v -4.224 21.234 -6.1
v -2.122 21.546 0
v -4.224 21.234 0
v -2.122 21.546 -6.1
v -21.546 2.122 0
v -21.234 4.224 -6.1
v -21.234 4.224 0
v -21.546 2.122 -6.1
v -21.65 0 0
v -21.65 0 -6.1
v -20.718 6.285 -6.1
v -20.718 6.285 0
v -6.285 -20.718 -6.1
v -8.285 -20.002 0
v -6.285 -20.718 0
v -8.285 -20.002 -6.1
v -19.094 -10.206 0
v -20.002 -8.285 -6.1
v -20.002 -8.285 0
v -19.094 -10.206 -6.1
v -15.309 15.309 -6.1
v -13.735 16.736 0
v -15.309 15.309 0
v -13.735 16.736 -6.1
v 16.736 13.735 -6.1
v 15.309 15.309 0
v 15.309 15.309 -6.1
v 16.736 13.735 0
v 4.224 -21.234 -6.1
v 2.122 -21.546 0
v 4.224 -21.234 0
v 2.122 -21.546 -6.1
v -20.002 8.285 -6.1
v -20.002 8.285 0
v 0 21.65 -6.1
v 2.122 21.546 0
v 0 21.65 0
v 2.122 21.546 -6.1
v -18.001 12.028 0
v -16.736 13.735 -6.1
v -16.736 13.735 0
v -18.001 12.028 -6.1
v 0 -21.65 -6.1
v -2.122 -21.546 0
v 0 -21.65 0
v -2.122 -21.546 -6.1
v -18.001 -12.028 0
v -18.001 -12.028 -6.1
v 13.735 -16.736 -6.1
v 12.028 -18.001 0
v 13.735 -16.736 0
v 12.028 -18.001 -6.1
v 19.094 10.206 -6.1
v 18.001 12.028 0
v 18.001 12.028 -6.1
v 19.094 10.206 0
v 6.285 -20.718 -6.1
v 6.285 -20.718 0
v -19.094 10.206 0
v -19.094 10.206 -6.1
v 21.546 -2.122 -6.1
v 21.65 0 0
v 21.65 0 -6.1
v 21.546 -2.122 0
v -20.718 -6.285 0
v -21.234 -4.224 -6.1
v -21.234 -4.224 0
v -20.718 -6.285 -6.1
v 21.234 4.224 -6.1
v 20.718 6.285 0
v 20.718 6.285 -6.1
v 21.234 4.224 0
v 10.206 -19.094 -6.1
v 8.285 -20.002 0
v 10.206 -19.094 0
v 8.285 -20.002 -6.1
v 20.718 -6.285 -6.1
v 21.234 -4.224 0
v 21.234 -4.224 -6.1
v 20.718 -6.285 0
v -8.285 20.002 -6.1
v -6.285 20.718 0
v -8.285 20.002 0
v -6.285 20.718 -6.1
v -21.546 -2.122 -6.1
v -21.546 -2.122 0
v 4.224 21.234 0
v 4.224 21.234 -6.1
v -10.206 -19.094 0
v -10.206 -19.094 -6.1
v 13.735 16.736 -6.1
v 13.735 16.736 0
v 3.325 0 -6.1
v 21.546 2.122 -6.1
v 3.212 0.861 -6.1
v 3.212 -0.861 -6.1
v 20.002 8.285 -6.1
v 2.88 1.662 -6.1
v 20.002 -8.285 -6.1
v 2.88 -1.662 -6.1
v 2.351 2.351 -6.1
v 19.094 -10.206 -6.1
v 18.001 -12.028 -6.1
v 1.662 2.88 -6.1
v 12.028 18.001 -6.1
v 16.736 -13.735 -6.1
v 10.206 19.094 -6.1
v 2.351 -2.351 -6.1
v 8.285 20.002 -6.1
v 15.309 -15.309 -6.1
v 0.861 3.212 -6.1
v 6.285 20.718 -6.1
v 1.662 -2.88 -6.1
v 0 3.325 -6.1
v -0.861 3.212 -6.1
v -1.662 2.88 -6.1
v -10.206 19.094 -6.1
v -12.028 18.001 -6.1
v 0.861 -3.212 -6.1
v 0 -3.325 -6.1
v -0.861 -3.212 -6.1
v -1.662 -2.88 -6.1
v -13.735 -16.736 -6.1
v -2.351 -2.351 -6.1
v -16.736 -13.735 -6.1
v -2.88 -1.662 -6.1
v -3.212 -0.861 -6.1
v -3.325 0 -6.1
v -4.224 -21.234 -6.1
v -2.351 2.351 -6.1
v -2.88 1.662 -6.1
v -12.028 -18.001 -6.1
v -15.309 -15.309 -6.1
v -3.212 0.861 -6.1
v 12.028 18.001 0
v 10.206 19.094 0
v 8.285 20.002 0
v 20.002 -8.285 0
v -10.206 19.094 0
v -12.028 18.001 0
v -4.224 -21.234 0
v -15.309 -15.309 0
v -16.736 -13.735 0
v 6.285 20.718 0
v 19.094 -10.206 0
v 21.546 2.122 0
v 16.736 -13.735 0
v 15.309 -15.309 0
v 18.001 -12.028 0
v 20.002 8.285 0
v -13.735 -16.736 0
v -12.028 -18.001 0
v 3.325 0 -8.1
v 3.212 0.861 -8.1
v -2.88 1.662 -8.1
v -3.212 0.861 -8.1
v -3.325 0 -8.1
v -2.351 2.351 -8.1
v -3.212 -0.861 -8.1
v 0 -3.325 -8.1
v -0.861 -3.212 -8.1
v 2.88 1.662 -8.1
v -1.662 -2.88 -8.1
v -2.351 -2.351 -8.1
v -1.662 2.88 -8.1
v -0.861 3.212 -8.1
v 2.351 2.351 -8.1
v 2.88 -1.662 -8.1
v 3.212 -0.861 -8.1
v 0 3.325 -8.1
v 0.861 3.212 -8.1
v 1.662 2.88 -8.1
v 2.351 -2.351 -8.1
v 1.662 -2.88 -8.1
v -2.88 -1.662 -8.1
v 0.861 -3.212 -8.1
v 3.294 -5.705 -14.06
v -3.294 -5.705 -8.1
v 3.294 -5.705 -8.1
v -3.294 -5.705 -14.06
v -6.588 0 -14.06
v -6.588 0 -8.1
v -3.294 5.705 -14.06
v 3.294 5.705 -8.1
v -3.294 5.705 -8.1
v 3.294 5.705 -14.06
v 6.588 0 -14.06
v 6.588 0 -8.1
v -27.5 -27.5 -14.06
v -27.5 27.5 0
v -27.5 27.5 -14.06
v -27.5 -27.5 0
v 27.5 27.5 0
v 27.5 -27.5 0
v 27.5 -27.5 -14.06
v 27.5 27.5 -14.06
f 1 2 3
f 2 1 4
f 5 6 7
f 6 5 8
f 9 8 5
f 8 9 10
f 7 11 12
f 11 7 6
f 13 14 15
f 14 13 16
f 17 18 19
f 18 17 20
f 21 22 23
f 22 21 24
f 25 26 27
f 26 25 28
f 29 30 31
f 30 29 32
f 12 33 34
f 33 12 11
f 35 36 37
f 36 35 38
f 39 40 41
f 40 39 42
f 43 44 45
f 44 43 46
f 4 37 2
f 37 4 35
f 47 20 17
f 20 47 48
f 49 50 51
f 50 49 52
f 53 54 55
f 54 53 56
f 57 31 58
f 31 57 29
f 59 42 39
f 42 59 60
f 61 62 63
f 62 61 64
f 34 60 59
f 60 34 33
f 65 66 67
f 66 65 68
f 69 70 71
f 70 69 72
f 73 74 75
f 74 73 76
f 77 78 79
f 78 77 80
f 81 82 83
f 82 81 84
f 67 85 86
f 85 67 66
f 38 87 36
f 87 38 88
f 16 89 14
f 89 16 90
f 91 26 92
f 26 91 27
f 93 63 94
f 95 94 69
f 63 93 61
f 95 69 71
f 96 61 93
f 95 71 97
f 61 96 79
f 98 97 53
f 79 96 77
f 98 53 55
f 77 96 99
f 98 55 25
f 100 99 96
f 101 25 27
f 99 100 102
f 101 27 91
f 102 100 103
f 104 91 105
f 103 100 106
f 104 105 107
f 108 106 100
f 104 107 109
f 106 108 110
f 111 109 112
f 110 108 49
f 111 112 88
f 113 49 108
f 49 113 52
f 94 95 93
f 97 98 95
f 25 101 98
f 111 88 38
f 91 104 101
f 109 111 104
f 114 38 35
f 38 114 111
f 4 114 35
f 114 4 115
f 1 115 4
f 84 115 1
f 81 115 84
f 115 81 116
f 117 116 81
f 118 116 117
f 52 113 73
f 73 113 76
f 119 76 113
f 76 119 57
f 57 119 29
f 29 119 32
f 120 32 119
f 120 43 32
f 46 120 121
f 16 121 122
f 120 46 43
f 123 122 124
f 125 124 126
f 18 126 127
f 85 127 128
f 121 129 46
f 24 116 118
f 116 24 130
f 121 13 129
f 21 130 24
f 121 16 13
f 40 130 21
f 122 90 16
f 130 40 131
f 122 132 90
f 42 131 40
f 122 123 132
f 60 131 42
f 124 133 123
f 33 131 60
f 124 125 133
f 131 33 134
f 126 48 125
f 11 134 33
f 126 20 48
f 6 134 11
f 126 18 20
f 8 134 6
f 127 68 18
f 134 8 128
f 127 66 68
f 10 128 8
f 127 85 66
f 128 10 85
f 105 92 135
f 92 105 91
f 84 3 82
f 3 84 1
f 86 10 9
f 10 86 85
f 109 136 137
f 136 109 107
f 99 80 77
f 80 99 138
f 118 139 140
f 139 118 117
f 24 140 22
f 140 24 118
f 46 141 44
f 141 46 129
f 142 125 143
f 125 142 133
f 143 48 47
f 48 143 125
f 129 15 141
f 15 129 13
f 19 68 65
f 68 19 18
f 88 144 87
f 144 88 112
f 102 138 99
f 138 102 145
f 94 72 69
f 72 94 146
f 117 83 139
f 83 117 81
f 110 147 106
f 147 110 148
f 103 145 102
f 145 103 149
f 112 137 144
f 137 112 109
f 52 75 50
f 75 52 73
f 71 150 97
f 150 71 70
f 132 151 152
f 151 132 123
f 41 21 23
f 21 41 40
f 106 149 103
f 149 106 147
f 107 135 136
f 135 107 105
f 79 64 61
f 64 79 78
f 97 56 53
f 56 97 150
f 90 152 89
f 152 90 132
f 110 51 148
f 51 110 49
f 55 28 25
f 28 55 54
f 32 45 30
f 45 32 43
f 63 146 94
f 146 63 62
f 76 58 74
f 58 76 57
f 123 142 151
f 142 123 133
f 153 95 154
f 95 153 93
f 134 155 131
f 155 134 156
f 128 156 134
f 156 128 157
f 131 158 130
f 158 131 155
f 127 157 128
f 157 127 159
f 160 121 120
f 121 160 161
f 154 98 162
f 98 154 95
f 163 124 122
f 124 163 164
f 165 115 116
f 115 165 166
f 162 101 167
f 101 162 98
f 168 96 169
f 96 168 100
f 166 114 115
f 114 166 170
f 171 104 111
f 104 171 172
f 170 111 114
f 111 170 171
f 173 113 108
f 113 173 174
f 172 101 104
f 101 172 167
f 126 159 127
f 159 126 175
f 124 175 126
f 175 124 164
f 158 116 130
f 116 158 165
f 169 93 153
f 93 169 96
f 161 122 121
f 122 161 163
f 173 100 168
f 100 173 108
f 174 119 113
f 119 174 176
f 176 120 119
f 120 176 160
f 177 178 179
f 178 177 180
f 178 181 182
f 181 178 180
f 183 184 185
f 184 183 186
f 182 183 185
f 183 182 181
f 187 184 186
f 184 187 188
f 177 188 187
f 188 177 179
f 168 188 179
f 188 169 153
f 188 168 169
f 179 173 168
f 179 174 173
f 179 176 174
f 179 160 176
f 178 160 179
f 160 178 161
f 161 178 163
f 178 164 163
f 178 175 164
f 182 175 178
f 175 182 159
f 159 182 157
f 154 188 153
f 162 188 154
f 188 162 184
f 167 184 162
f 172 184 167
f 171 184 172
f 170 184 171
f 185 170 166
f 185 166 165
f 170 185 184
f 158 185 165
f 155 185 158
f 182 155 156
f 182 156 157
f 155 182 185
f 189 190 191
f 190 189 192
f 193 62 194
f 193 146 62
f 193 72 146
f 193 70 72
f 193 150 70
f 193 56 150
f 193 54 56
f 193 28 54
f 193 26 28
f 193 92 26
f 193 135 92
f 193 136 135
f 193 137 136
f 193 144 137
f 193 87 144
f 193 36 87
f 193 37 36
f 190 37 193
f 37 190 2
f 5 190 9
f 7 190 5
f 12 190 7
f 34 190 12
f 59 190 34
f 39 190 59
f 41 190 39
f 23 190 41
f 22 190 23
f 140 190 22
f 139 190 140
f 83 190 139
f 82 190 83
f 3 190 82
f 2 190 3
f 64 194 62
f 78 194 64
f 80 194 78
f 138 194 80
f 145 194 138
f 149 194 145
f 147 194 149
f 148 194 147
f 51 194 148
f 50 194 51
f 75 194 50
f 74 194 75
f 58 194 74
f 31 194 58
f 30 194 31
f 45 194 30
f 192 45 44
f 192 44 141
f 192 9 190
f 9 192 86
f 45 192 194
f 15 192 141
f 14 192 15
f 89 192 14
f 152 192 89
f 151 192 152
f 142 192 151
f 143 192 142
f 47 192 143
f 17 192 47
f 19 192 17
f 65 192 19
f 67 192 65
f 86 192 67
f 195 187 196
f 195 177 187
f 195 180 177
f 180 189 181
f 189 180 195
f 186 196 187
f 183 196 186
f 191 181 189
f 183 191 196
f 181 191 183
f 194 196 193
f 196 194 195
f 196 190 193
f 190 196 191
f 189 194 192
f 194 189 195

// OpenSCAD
// file: lib/soft.scad
// Rounded building blocks for the softened parts.

// A slab from y = -t to y = 0, spanning x = [x0, x1] and z = [z0, z1], with
// its corners rounded by r (seen along y) and its back edges (at y = -t)
// rounded by rr. The front face (y = 0) stays flat for adhesive or contact.
module soft_slab(x, z, t, r, rr) {
  hull() for (cx = [x[0] + r, x[1] - r], cz = [z[0] + r, z[1] - r])
    translate([cx, 0, cz]) {
      rotate([90, 0, 0]) cylinder(r = r, h = t - rr, $fn = 48);
      translate([0, -t + rr, 0]) rotate([90, 0, 0]) rotate_extrude($fn = 48)
        translate([r - rr, 0]) circle(r = rr, $fn = 24);
    }
}

// A box [x0..x1] x [y0..y1] x [z0..z1] with every edge rounded by r.
module soft_box(x, y, z, r) {
  hull() for (cx = [x[0] + r, x[1] - r], cy = [y[0] + r, y[1] - r], cz = [z[0] + r, z[1] - r])
    translate([cx, cy, cz]) sphere(r = r, $fn = 24);
}

// 2D: fill concave corners with radius fillet, then round convex corners by
// round (which must be under half the thinnest wall, or the wall vanishes).
module soft_2d(fillet, round) {
  offset(r = round) offset(delta = -round) offset(r = -fillet) offset(delta = fillet) children();
}
// file: lib/joint.scad
// The two glued joints that join the three prints.
//
// Rod to plate: the rod's top end, D-shaped, goes up into a socket in the
// pocket's solid base, from the plate's bottom edge. The flat faces the
// monitor (+y), so the rod goes in one way only. Above the socket a cone,
// steep enough to print without support, narrows to the cord channel.
// In the mount's coordinates.
//
// Rod to dock: a flange on the rod's front end sits flat on the dock's back,
// a glue gap of fit / 2 away, and a teardrop spigot, point down, goes into a
// matching hole in the dock. In the Car Thing's local frame (geometry.scad),
// joint_x along the Car Thing, behind the plug board, where the rod meets the dock.

function socket_cone_h() = (rod_d + fit - cord_d - 1) / 2 * tan(socket_cone);

// The keep-side of the D flat: everything at y below the flat.
module d_flat_side(clear, z0, h) {
  translate([rod_x() - rod_d, rod_y() - rod_d, z0])
    cube([2 * rod_d, rod_d + rod_d / 2 - socket_flat + clear, h]);
}

// The rod's top end, from just under the plate's bottom edge up to socket_depth.
module rod_top_end() {
  intersection() {
    translate([rod_x(), rod_y(), -fit / 2]) cylinder(d = rod_d, h = socket_depth + fit / 2, $fn = $fn_rod);
    d_flat_side(0, -fit, socket_depth + 2 * fit);
  }
}

// The socket, fit larger than the rod's end, and the cone above it.
module socket_negative() {
  intersection() {
    union() {
      translate([rod_x(), rod_y(), -1]) cylinder(d = rod_d + fit, h = socket_depth + 1, $fn = $fn_rod);
      // Started 1 mm down and that much wider, so it meets the bore exactly at
      // socket_depth (an overlap there leaves a hairline ledge to print over).
      translate([rod_x(), rod_y(), socket_depth - 1])
        cylinder(d1 = rod_d + fit + 2 / tan(socket_cone), d2 = cord_d + 1, h = socket_cone_h() + 1, $fn = $fn_rod);
    }
    d_flat_side(fit / 2, -2, socket_depth + socket_cone_h() + 4);
  }
}

// A teardrop: a circle of diameter d with a 45 degree point toward +Y.
module teardrop_2d(d) {
  hull() {
    circle(d = d, $fn = 48);
    polygon([[0, d / 2 * sqrt(2)], [-d / 4, 0], [d / 4, 0]]);
  }
}

// The spigot's axis runs along local +y through this point, at the dock's back.
function joint_centre() = [joint_x, -backplate_thickness(), -ct_h / 2];

// The flange and spigot, in the local frame. rotate([-90, 0, 0]) turns the
// extrusion's +z to local +y and the 2D +Y to local -z, so the point is down.
module flange_local() {
  c = joint_centre();
  face = c[1] - fit / 2;
  translate([c[0], face, c[2]]) rotate([90, 0, 0]) cylinder(d = flange_d, h = flange_t, $fn = 96);
  translate([c[0], face - 0.01, c[2]]) rotate([-90, 0, 0])
    linear_extrude(spigot_len + fit / 2 + 0.01) teardrop_2d(spigot_d);
}

// The spigot's hole in the dock.
module spigot_hole_local() {
  c = joint_centre();
  translate([c[0], c[1] - 1, c[2]]) rotate([-90, 0, 0])
    linear_extrude(spigot_len + 0.5 + 1) offset(delta = fit / 2) teardrop_2d(spigot_d);
}

// Points around the flange's rim on both its faces, in the local frame.
function flange_rim_pts() =
  let (c = joint_centre(), r = flange_d / 2)
  [for (a = [0 : 15 : 345], y = [c[1] - fit / 2, c[1] - fit / 2 - flange_t])
     [c[0] + r * cos(a), y, c[2] + r * sin(a)]];
// file: lib/rod.scad
// The rod: the one visible part of the mount, and its own print. Its top end
// glues up into a socket under the pocket (joint.scad); it runs straight down
// the plate's back, on past the monitor's bottom edge, bends once behind the
// Car Thing, and runs straight forward to a flange glued to the centre of the
// dock's back. The cord runs inside it, from the pocket to the plug's board.

// Centred on the pocket, and the Car Thing centred on the rod.
function rod_x() = pocket_x0() + pocket[0] / 2;
// The vertical run sits against the plate's back, 1 mm into its line; inside
// the socket its D flat clears the plate.
function rod_y() = -plate_t - rod_d_hidden / 2 + 1;
// Where the forward run meets the dock's back: the Car Thing's centre.
function rod_entry() = ct_to_global(joint_centre());
// The cord channel's top, just inside the pocket's floor.
function cord_z_top() = pocket_z0 + 1;

// The rod prints standing as mounted; its lowest point is the flange's
// bottom edge, on the face toward the rod. The slicer supports the hidden
// underside of the bend, the forward run and the flange.
function rod_low_z() =
  ct_to_global(joint_centre())[2] - (fit / 2 + flange_t) * sin(tilt) - flange_d / 2 * cos(tilt);

// The highest z on the vertical run below which the rod, at rod_d_hidden, is
// hidden from the seat: its front and both sides, at every z down to the bend.
// Above it the rod shows and stays rod_d; below it the rod may thicken.
function rod_surface_hidden(z) =
  let (r = rod_d_hidden / 2)
  len([for (p = [[rod_x(), rod_y() + r, z], [rod_x() - r, rod_y(), z], [rod_x() + r, rod_y(), z]])
         if (!hidden_from_eye(global_to_ct(p))) p]) == 0;
function rod_hide_z() =
  let (zf = rod_entry()[2] + rod_bend_r, zs = [for (z = [0 : -0.5 : zf]) z],
       ok = [for (i = [0 : len(zs) - 1]) if (len([for (j = [i : len(zs) - 1]) if (!rod_surface_hidden(zs[j])) j]) == 0) zs[i]])
  len(ok) > 0 ? ok[0] : zf;
// The taper from rod_d to rod_d_hidden starts 2 mm below that line.
function rod_taper_z0() = rod_hide_z() - 2;
function rod_taper_len() = min(10, rod_taper_z0() - (rod_entry()[2] + rod_bend_r));

// The cord's top in the pocket, the bend's corner, and the dock's back.
function rod_corners() = [
  [rod_x(), rod_y(), cord_z_top()],
  [rod_x(), rod_y(), rod_entry()[2]],
  rod_entry()
];

// Points along the forward run's top, from the bend's end to the dock.
function rod_visible_pts() =
  let (y0 = rod_y() + rod_bend_r, y1 = rod_entry()[1], z = rod_entry()[2] + rod_d_hidden / 2)
  [for (y = [y0 : 5 : y1]) [rod_x(), y, z], [rod_x(), y1, z]];

// The bend's quarter torus.
module rod_bend() {
  translate([rod_x(), rod_y() + rod_bend_r, rod_entry()[2] + rod_bend_r])
    multmatrix([[0, 0, 1, 0], [-1, 0, 0, 0], [0, -1, 0, 0], [0, 0, 0, 1]])
      rotate_extrude(angle = 90, $fn = $fn_rod)
        translate([rod_bend_r, 0]) circle(d = rod_d_hidden, $fn = $fn_rod);
}

module rod_solid() { rod_body(); }

module rod_body() {
  x = rod_x(); y = rod_y(); zf = rod_entry()[2]; r = rod_bend_r;
  d = rod_d_hidden;
  // The flare reaches past the dock's back all round (it leans forward below
  // the entry by its radius x tan(tilt)) and is cut at the flange's face.
  y_end = rod_entry()[1] + (d + 8) / 2 * tan(tilt) + 1;
  // The top end, D-shaped, up in the socket.
  rod_top_end();
  // Vertical run: rod_d from the plate's bottom edge down to the taper, then
  // rod_d_hidden. (A uniform rod, rod_d_hidden == rod_d, has no taper to place.)
  zt = rod_d_hidden > rod_d ? rod_taper_z0() : zf + r;
  tl = rod_d_hidden > rod_d ? rod_taper_len() : 0;
  translate([x, y, zt]) cylinder(d = rod_d, h = -fit / 2 - zt, $fn = $fn_rod);
  if (tl > 0) {
    translate([x, y, zt - tl]) cylinder(d1 = d, d2 = rod_d, h = tl, $fn = $fn_rod);
    translate([x, y, zf + r]) cylinder(d = d, h = zt - tl - zf - r, $fn = $fn_rod);
  }
  // The bend: a quarter torus in the y-z plane, centred on the corner's
  // inside. rotate_extrude sweeps +X to +Y; mapped so +X -> -y, +Y -> -z.
  rod_bend();
  // Forward run, flaring over its last 8 mm into the flange, and cut off
  // inside the flange, short of its face (a coplanar cut leaves slivers).
  difference() {
    union() {
      translate([x, y + r, zf]) rotate([-90, 0, 0]) cylinder(d = d, h = y_end - y - r - 8, $fn = $fn_rod);
      translate([x, y_end - 8, zf]) rotate([-90, 0, 0]) cylinder(d1 = d, d2 = d + 8, h = 8, $fn = $fn_rod);
    }
    ct_place() translate([-50, joint_centre()[1] - fit / 2 - 0.5, -ct_h - 50]) cube([ct_w + 100, 100, ct_h + 100]);
  }
  ct_place() flange_local();
}

function cord_corners() = dedupe([
  rod_corners()[0],
  rod_corners()[1],
  rod_entry(),
  ct_to_global(dock_cord_end())
]);

function cord_path() = round_path(cord_corners(), cord_bend_r);

// margin grows the channel, so the leak test can demand a minimum wall.
module cord_channel(margin = 0) { tube(cord_path(), cord_d + 1 + 2 * margin); }
// file: lib/pocket.scad
// The pocket behind the plate for the charge-through cable, the C-to-A
// adapter and the Wi-Fi dongle, and where the shelf slot sits beside it.
// The pocket's outer face is open inside a retaining frame, in case the
// monitor's back is metal; put the dongle at that open face.

function shelf_x0() = plate_r;  // clear of the plate's rounded corner
// The plate's vertical ribs: each one's left edge. One at the plate's left
// edge, beside the shelf, and two over the pocket; the shelf's tall lip
// stiffens the stretch between.
function rib_xs() = [wall, 2 * plate_w / 3, plate_w - wall - rib_w];
function pocket_x0() = plate_w - pocket[0] - wall;

module pocket_positive() {
  // Rounded on every edge; its plate side sinks into the plate. Solid from
  // the plate's bottom edge up to the pocket's floor: the rod's socket is
  // bored up into that base. It starts below
  // the bottom edge and the plate is cut flat there (plate_part()).
  soft_box([pocket_x0() - wall, pocket_x0() + pocket[0] + wall],
           [-plate_t - pocket[1], -plate_t + 1],
           [-soft_r - 1, pocket_z0 + pocket[2] + wall], soft_r);
}

module pocket_negative() {
  // The cavity.
  translate([pocket_x0(), -plate_t - pocket[1] + wall, pocket_z0])
    cube([pocket[0], pocket[1] - wall + 0.01, pocket[2]]);
  // The open outer face, inside the frame.
  translate([pocket_x0() + pocket_frame - wall, -plate_t - pocket[1] - 1, pocket_z0 + pocket_frame - wall])
    cube([pocket[0] - 2 * pocket_frame + 2 * wall, wall + 2, pocket[2] - 2 * pocket_frame + 2 * wall]);
  // The power cable's exit: a notch down from the top of the side wall
  // toward the monitor's edge, open at the top so the cable lays in, and
  // It cuts the wall only.
  translate([pocket_x0() + pocket[0], -plate_t - pocket[1] / 2 - 4, pocket_z0 + pocket[2] / 2])
    cube([wall + 1, 8, pocket[2] / 2 + wall + 1]);
}

// The plate's vertical ribs, on its back, each with its lower end sloping
// back into the plate so it doesn't start in mid-air.
module plate_ribs() {
  for (x = rib_xs())
    translate([0, -plate_t + 0.5, 0]) hull() {
      soft_box([x, x + rib_w], [-5.5, 0], [rib_z0 + 6.5, plate_h - plate_r], 1.4);
      translate([x, -0.5, rib_z0]) cube([rib_w, 0.5, plate_h - plate_r - rib_z0 - 1.4]);
    }
}
// file: lib/dock.scad
// The dock: the hidden backplate behind the Car Thing, in its local frame
// (see geometry.scad). A rounded slab bears on the Car Thing's raised
// platform and stands ct_step clear of its thin ends; the pot magnet sits
// flush in its front, on the platform; a block over the thin tab end holds
// the USB-C plug breakout, pointing +x at the port in the platform's end wall.
//
// The board lies in the x-z plane at y = ct_port_y, its plug through a slot
// in the block's shoulder (the +x face). The shoulder is the hard stop: the
// Car Thing slides -x onto the plug until the port wall meets it. The board
// slides in from the block's open bottom and is potted with epoxy; the -x end
// is closed and takes the docking push. The cord reaches the board from
// behind, through the backplate. The rod is a separate print: its spigot
// glues into a hole in the dock's back (joint.scad), behind the board.

// The block's length along x from the port wall: shoulder, board, closed end.
function dock_block_len() = plug_shoulder + plug_board[1] + fit + wall;
// How far the plug goes into the port.
function dock_engaged() = plug_len - plug_shoulder;
// The block's furthest local y, toward the thin end's surface: the board plus
// a thin wall. The plug's shell may pass beyond it, through the shoulder slot.
function dock_block_front() = ct_port_y + plug_board[2] / 2 + fit + dock_floor_wall;
function dock_block_half_h() = plug_board[0] / 2 + fit + wall;
// Where the cord channel ends: behind the board, under the rod's axis.
function dock_cord_end() = [joint_x, ct_port_y - plug_board[2] / 2 - 1.5, -ct_port_z];

function dock_x1() = ct_platform[0] - fit;  // the shoulder face
function dock_board_x0() = dock_x1() - plug_shoulder - plug_board[1] - fit;  // the board's far end
function dock_plate_box() = [[bp_inset, ct_w - bp_inset], [-ct_h + bp_inset, -bp_inset]];  // [x range, z range]

// Points the visibility rule tests: the plate's real rounded outline at its
// front face, where its back edge round starts, and on its back face (shrunk
// by that round), every 10 degrees around each corner; and the block's corners.
function dock_outline_pts() =
  let (
    b = dock_plate_box(), bt = backplate_thickness(), rr = bp_r / 2,
    zc = -ct_port_z, h = dock_block_half_h(),
    corners = [[b[0][0] + bp_r, b[1][0] + bp_r, 180], [b[0][1] - bp_r, b[1][0] + bp_r, 270],
               [b[0][1] - bp_r, b[1][1] - bp_r, 0], [b[0][0] + bp_r, b[1][1] - bp_r, 90]]
  )
  concat(
    [for (c = corners, a = [c[2] : 10 : c[2] + 90], yr = [[0, bp_r], [-bt + rr, bp_r], [-bt, bp_r - rr]])
       [c[0] + yr[1] * cos(a), yr[0], c[1] + yr[1] * sin(a)]],
    [for (x = [dock_x1() - dock_block_len(), dock_x1()], z = [zc - h, zc + h], y = [0, dock_block_front()]) [x, y, z]]
  );

// The board pocket and the plug's slot through the shoulder, as a box in the
// local frame: [[x0, y0, z0], [x1, y1, z1]].
function dock_board_box() = [
  [dock_board_x0(), ct_port_y - plug_board[2] / 2 - 2.5, -ct_port_z - dock_block_half_h() - 1],
  [dock_x1() + 1, dock_block_front(), -ct_port_z + dock_block_half_h()]
];

module dock_plate() {
  b = dock_plate_box();
  soft_slab(b[0], b[1], backplate_thickness(), bp_r, bp_r / 2);
}

module dock_block() {
  zc = -ct_port_z;
  h = dock_block_half_h();
  r = 1;
  hull() for (x = [dock_x1() - dock_block_len() + r, dock_x1() - r],
              y = [-1, dock_block_front() - r],
              z = [zc - h + r, zc + h - r])
    translate([x, y, z]) sphere(r = r, $fn = 16);
}

module dock_board_pocket() {
  zc = -ct_port_z;
  bw = plug_board[0] + fit;
  x1 = dock_board_x0();
  // The board, with room behind it (-y) for the solder joints, open to the
  // block's bottom so it slides in.
  translate([x1, ct_port_y - plug_board[2] / 2 - 2.5, zc - dock_block_half_h() - 1])
    cube([plug_board[1] + fit, plug_board[2] + 2.5 + fit, bw / 2 + dock_block_half_h() + 1]);
  // The plug's shell through the shoulder, also open to the bottom.
  translate([dock_x1() - plug_shoulder - 1, ct_port_y - (plug_t + fit) / 2, zc - dock_block_half_h() - 1])
    cube([plug_shoulder + 2, plug_t + fit, (plug_w + fit) / 2 + dock_block_half_h() + 1]);
}

module dock_local() {
  difference() {
    union() {
      dock_plate();
      dock_block();
    }
    translate([ct_magnet_center[0], 0, -ct_magnet_center[1]]) rotate([-90, 0, 0]) magnet_seat();
    dock_board_pocket();
    spigot_hole_local();
  }
}
// file: lib/shelf.scad
// One shelf slot: a floor and a tall lip along the long side, no end walls.
// Attaches to a plate's back face at y = 0 and reaches into -Y; the floor's
// top is z = 0. The item stands ports-down: the floor is open down the middle
// for its plugs, and the item rests on a ledge each side. The floor stays
// solid at each end, and that is what ties the lip to the plate.

function slot_inner() = item_t + slot_clear;
function slot_depth() = slot_inner() + wall;
// How far the slot reaches below its floor's top: the floor and the fillet
// under it. No gussets: they would hang below the plate.
function shelf_below() = floor_t + soft_r;
// The standalone shelf's plate corners, and its slot's height above the
// plate's bottom: as on the main mount, so the plugs end above it.
function standalone_r() = plate_r;
function standalone_slot_z() = shelf_z;
// The standalone shelf's plate: tall enough to resist peel and to back the item.
function standalone_h() = max(3 * slot_depth(), standalone_slot_z() + item_h + 4);

// How far below the floor's top the slot reaches: the floor and the fillet under it.
function shelf_reach() = floor_t + soft_r + 1;

// The slot's side profile in (y, z), with a stub of the plate behind it so
// the floor's root gets a fillet; inside corners get a soft_r fillet and
// outside corners as much round as the 2.4 mm lip allows.
module shelf_profile() {
  d = slot_depth();
  lo = shelf_reach();
  soft_2d(soft_r, min(soft_r, wall / 2 - 0.2)) union() {
    translate([-d, -floor_t]) square([d + 0.01, floor_t]);
    translate([-d, 0]) square([wall, lip_h]);
    translate([0, -lo]) square([plate_t, lo + lip_h + 4]);
  }
}

// The item standing ports-down in a slot of length len, centred along it,
// with its plugs below it. The plugs run its whole length, since their
// positions along the edge vary. It sits half a millimetre up, on the
// fillets in the slot's inside corners. For the clash test.
module shelf_item(len) {
  x0 = (len - item_len) / 2;
  translate([x0, -(slot_inner() + item_t) / 2, 0.5]) cube([item_len, item_t, item_h]);
  translate([x0, -(slot_inner() + item_plug_t) / 2, 0.5 - item_plug_drop]) cube([item_len, item_plug_t, item_plug_drop]);
}

module shelf_slot(len) {
  d = slot_depth();
  lo = shelf_reach();
  difference() {
    // The profile, extruded along x, with the plate stub clipped back into the plate.
    intersection() {
      rotate([90, 0, 90]) linear_extrude(len) shelf_profile();
      translate([-1, -d - 1, -lo]) cube([len + 2, d + 1 + plate_t, lo + lip_h + 6]);
    }
    // The opening for the plugs, between the ledges and the solid ends, its
    // corners chamfered at 45 degrees.
    translate([0, 0, -lo - 1]) linear_extrude(lo + 2)
      offset(delta = 2, chamfer = true) offset(delta = -2)
        translate([floor_end, -slot_inner() + ledge]) square([len - 2 * floor_end, slot_inner() - 2 * ledge]);
  }
}
// file: lib/magnet.scad
// The pot magnet's seat: a pocket open at the face, a through-hole for the
// stud, and a hex pocket from the back for the nut on the stud's end.
// Negative volume. Face plane at z = 0, magnet face pointing +Z.

function magnet_pocket_depth() = magnet_t;
// The length to cut the stud to, so it ends just inside the backplate's back.
function stud_cut() = backplate_thickness() - magnet_t - 0.2;

module magnet_seat() {
  bt = backplate_thickness();
  translate([0, 0, -magnet_pocket_depth()]) cylinder(d = magnet_d + fit, h = magnet_pocket_depth() + 1);
  translate([0, 0, -bt - 1]) cylinder(d = stud_d + fit, h = bt + 2, $fn = 24);
  translate([0, 0, -bt - 1]) cylinder(d = (nut_af + fit) / cos(30), h = nut_t + 0.4 + 1, $fn = 6);
}
// file: lib/path.scad
// Polylines with rounded corners, for the cord channel.

function unit(v) = v / norm(v);
function turn(a, c, b) = acos(max(-1, min(1, unit(c - a) * unit(b - c))));
function tangent_len(a, c, b, r) = r * tan(turn(a, c, b) / 2);

// Arc points replacing corner c, radius r.
function fillet(a, c, b, r) =
  let (th = turn(a, c, b))
  th < 0.5 ? [c] :
  let (
    u = unit(c - a), v = unit(b - c),
    L = r * tan(th / 2), s = c - u * L, e = c + v * L,
    o = c + unit(v - u) * (r / cos(th / 2)),
    n = max(2, ceil(th / 10))
  ) [for (i = [0:n]) let (t = i / n) o + r * unit((1 - t) * (s - o) + t * (e - o))];

function round_path(p, r) =
  concat([p[0]], [for (i = [1:len(p) - 2]) each fillet(p[i - 1], p[i], p[i + 1], r)], [p[len(p) - 1]]);

// True when every segment is long enough for the fillets at both its ends.
function path_fits(p, r) =
  len([for (i = [0:len(p) - 2])
    let (
      need = (i > 0 ? tangent_len(p[i - 1], p[i], p[i + 1], r) : 0)
           + (i < len(p) - 2 ? tangent_len(p[i], p[i + 1], p[i + 2], r) : 0)
    ) if (need > norm(p[i + 1] - p[i]) + 0.01) i]) == 0;

// Drops repeated points, so a corner that lands on its neighbour is harmless.
function dedupe(p) = [for (i = [0:len(p) - 1]) if (i == 0 || norm(p[i] - p[i - 1]) > 0.01) p[i]];

// A round tube with a 45 degree peak along its top (+z), so where it runs
// level its roof prints without support.
module tube(p, d) {
  module drop() hull() {
    sphere(d = d, $fn = 16);
    translate([0, 0, d / 2 * sqrt(2)]) sphere(d = 0.01, $fn = 4);
  }
  for (i = [0:len(p) - 2]) hull() {
    translate(p[i]) drop();
    translate(p[i + 1]) drop();
  }
}
// file: lib/geometry.scad
// Where the tilted backplate and the Car Thing sit, as functions the parts and
// the checks share.
//
// The backplate is built in the Car Thing's own frame ("local"): x along its
// width (0 at its left edge), y out of its back face (0 at the back face,
// ct_t at the screen), z up its face (0 at its top edge, -ct_h at the bottom).
// ct_place() turns that frame into the mount's coordinates.

// The magnet pocket, a web, and the nut pocket opening on the hidden back.
// The stud is cut short to fit (stud_cut() in magnet.scad).
function backplate_thickness() = magnet_t + magnet_web + nut_t + 0.4;

// Leaning back by `tilt` about X: (y, z) -> (y cos - z sin, y sin + z cos).
function lean(p) = [p[0] * cos(tilt) - p[1] * sin(tilt), p[0] * sin(tilt) + p[1] * cos(tilt)];

// The backplate's back face starts ct_reach past the screen face, and the Car
// Thing's top-front corner sits ct_top_gap below the monitor's bottom edge.
function ct_origin() = [
  monitor_depth + ct_reach + backplate_thickness() * cos(tilt),
  -ct_top_gap - ct_t * sin(tilt)
];

// The rod meets the Car Thing joint_x from its tab end (joint.scad); it may
// overhang the plate.
function ct_x0() = rod_x() - joint_x;

// Local [x, y, z] -> mount [x, y, z].
function ct_to_global(p) =
  let (o = ct_origin(), r = lean([p[1], p[2]]))
  [p[0] + ct_x0(), o[0] + r[0], o[1] + r[1]];

// Mount [x, y, z] -> local [x, y, z]: the inverse of ct_to_global.
function global_to_ct(g) =
  let (o = ct_origin(), y = g[1] - o[0], z = g[2] - o[1])
  [g[0] - ct_x0(), y * cos(tilt) + z * sin(tilt), -y * sin(tilt) + z * cos(tilt)];

// The owner's eyes, in the mount's coordinates. The owner sits centred on the
// monitor, and the Car Thing's centre is mount_x to the right of that.
function eye_global() = [ct_x0() + ct_w / 2 - mount_x, monitor_depth + eye[0], eye[1]];

// True when the Car Thing's body hides a point (in its local frame) from the
// owner's eyes. A point behind the back face (y < 0) is hidden when the line
// to the eye passes through the back face inside its outline (shrunk by the
// edge margin, with rounded corners); a point in front of it must lie inside
// that outline.
function in_ct_outline(q) =
  let (
    r = ct_corner_r - ct_edge_margin,
    cx = min(max(q[0], ct_corner_r), ct_w - ct_corner_r),
    cz = min(max(q[2], -ct_h + ct_corner_r), -ct_corner_r)
  ) norm([q[0] - cx, q[2] - cz]) <= r;
function hidden_from_eye(p) =
  let (e = global_to_ct(eye_global()))
  p[1] >= 0 ? in_ct_outline(p)
            : let (t = (0 - e[1]) / (p[1] - e[1])) in_ct_outline(e + t * (p - e));

module ct_place() {
  o = ct_origin();
  translate([ct_x0(), o[0], o[1]]) rotate([tilt, 0, 0]) children();
}

// The inverse of ct_place(): mount coordinates back to the local frame.
module ct_unplace() {
  o = ct_origin();
  rotate([-tilt, 0, 0]) translate(-[ct_x0(), o[0], o[1]]) children();
}

// The Car Thing's side profile after tilt, as [y, z] corners:
// back-top, front-top, front-bottom, back-bottom.
function ct_corners() = [
  for (c = [[0, 0], [ct_t, 0], [ct_t, -ct_h], [0, -ct_h]])
    let (g = ct_to_global([0, c[0], c[1]])) [g[1], g[2]]
];

// Height of the line from the owner's eyes to the screen's bottom edge, at y.
function sight_line_z(y) = (y - monitor_depth) * eye[1] / eye[0];

function lowest_z() = min([for (c = ct_corners()) c[1]]);

// The model reads as the owner sees it, x to their right and y toward them,
// which makes a left-handed frame; OpenSCAD's is right-handed. So every
// printed part and render goes out mirrored in x, and the real part matches.
function as_owner_pt(p) = [-p[0], p[1], p[2]];
module as_owner() { mirror([1, 0, 0]) children(); }
// file: params.scad
// Every dimension of the monitor mount, in millimetres and degrees.
// Lines marked MEASURE are placeholders until the owner measures the real part.
//
// Coordinates: origin at the monitor's bottom edge, on its back face, at the
// plate's left edge. +X runs to the owner's right, +Y toward the owner (the
// screen face is at y = monitor_depth), +Z up (the bottom edge is z = 0).
// That frame is left-handed, so every output is mirrored in x (as_owner() in
// lib/geometry.scad) to make the printed parts match it.

$fn = 64;

// Monitor (Kuycon G27P)
monitor_depth = 22;
tilt = 15;              // backplate leans back from the screen's plane
ct_top_gap = 6;         // Car Thing's top-front edge sits this far below the bottom edge
ct_reach = 0;           // the backplate's back face starts this far past the screen face

// Car Thing, from the owner's photos and measurements (shape confirmed
// 2026-11-06). Its back has one raised flat platform in the middle, with the
// steel the magnet grips, curving down to a thinner end each side: the tab
// end on the left seen from the front, the dial end on the right. The USB-C
// port is in the platform's end wall, facing the tab end. The dial is on the
// front face at the dial end; four buttons are on the top edge.
ct_w = 116;             // measured: width (body, without the dial)
ct_h = 64;              // measured: height
ct_t = 15;              // measured: thickness at the platform
ct_corner_r = 6;        // MEASURE body corner radius seen from the back
ct_edge_margin = 1;     // the body's edges are rounded; count this much of them as see-through
ct_thin_tab = [0, 46];  // measured: x range of the thin end at the tab end
ct_platform = [46, 92]; // measured: x range of the raised platform
ct_thin_dial = [92, 116];  // measured: x range of the thin end at the dial end
ct_step = 5;            // measured 5-6: how far the thin ends sit below the platform
ct_port_z = 32;         // from photo: port centred top to bottom
ct_port_y = 2.2;        // from photo: port centre ~2.0-2.3 below the platform's surface
ct_port_depth = 7;      // MEASURE how far a plug can go into the port
ct_tab = [32, 8, 3];    // MEASURE tab past the tab end: [centre below top, height, how far out]
ct_dial_overhang = 4;   // MEASURE how far the dial sticks out past the dial end

// Magnet (Magnetpro pot magnet)
magnet_d = 43;
magnet_t = 6.1;
stud_d = 6.35;          // 1/4"-20
stud_len = 12.7;        // as bought; cut to stud_cut() before fitting
nut_af = 11.11;         // 1/4-20 hex nut, 7/16" across flats
nut_t = 5.56;
magnet_web = 2;         // plastic between the magnet pocket and the nut pocket
fit = 0.3;              // printed clearance
// The magnet sits centred on the platform: [from left, from top].
ct_magnet_center = [(ct_platform[0] + ct_platform[1]) / 2, ct_h / 2];

// USB-C plug breakout fixed to the mount
plug_w = 9;             // MEASURE plug shell width
plug_t = 3.3;           // MEASURE plug shell thickness
plug_len = 6.5;         // MEASURE length the plug sticks out past the board
plug_board = [12, 15, 1.6];  // MEASURE board [width, length, thickness]
plug_shoulder = 1.2;    // plastic over the board's plug end; the plug passes through it

// Cord from the pocket to the plug
cord_d = 4;             // MEASURE
cord_bend_r = 10;       // MEASURE smallest bend it takes without force

// The dock: the hidden backplate behind the Car Thing
bp_inset = 4;           // the backplate's outline sits this far inside the Car Thing's
bp_r = 6;               // its corner radius; its back edges round at bp_r / 2
dock_floor_wall = 1;    // the plug block's wall toward the thin end's surface

// The rod: rod_d where it shows, rod_d_hidden behind the Car Thing. The owner
// chose one even 22 mm rod (2026-11-04), so it looks the same from any seat
// height.
rod_d = 22;
rod_d_hidden = rod_d;
rod_bend_r = 14;        // the bend's centreline radius
$fn_rod = 96;

// Stiffness under a button press (stiffness.scad)
petg_E = 2000;          // MPa
petg_G = 750;           // MPa
press_N = 5;            // a firm press
ct_end_buttons = [13, 103];  // MEASURE x of the top row's end buttons
// mm, the most a press may move the Car Thing. 0.1 while the rod met the Car
// Thing's centre; it now meets it off-centre (joint_x), behind the plug board.
sag_max = 0.14;
finger_d = 16;          // a fingertip pressing the top buttons

// Plate
plate_t = 4;
plate_r = 10;           // the plates' corner radius
soft_r = 2;             // round on every hidden edge
plate_w = 200;
plate_h = 120;
wall = 2.4;
rib_w = 3;              // the plate's ribs, on its back

// Shelf slots. The items stand ports-down, with plugs in their ports, so the
// floor is open down the middle for the plugs and the item rests on a ledge
// each side.
slot_len = 114.3;       // 4.5 in
item_t = 19.05;         // 3/4 in
item_len = 76.2;        // 3 in
item_h = 50.8;          // 2 in; items stand this tall
item_plug_drop = 40;    // MEASURE how far the plugs stick out below the item, to where the cable can bend
item_plug_t = 10;       // MEASURE the plugs' thickness across the item (ports assumed centred in it)
slot_clear = 1.5;
lip_h = 35;             // past the item's middle, so it can't tip out over it
floor_t = 3;
ledge = 4;              // the item rests on this much floor each side of the opening
floor_end = 12;         // solid floor at each end: all that ties the lip to the plate
shelf_z = item_plug_drop + 2;  // floor top above the plate's bottom edge, so the plugs end above it

// Joints (lib/joint.scad). The mount prints as three parts glued together:
// the plate, the rod and the dock.
socket_depth = 24;      // the rod's top end goes this far up into the pocket's base
socket_flat = 2;        // the D flat on the rod's top end, on the side toward the monitor
socket_cone = 50;       // the socket's top narrows to the cord channel at this angle from horizontal
joint_x = 41;           // the rod meets the dock this far from the tab end: behind the plug board, clear of the magnet
flange_d = 38;          // the flange on the rod's front end, glued flat to the dock's back
flange_t = 4;
spigot_d = 12;          // the teardrop spigot from the flange into the dock, point down, so it fits one way
spigot_len = 6;         // short: the dock is only backplate_thickness() deep

// Pocket for the charge-through cable, C-to-A adapter and dongle
pocket = [60, 30, 22];  // MEASURE contents [x, depth, height]
// The pocket's floor, above the plate's bottom edge: over the rod's socket
// and its cone, in the pocket's solid base.
pocket_z0 = socket_depth + (rod_d + fit - cord_d - 1) / 2 * tan(socket_cone) + wall;
pocket_frame = 4;       // retaining frame around the open outer face
rib_z0 = pocket_z0 + pocket[2] + wall + 2;  // plate ribs start above the pocket; none runs behind the shelf

// Owner's seat
eye = [600, 150];       // MEASURE [distance from screen, height above bottom edge]
mount_x = 150;          // MEASURE the Car Thing's centre, right of the monitor's centre (owner sits centred)
desk_clear = 120;       // MEASURE monitor bottom edge to desk

// Printer (Prusa MK4, with margin)
bed = [240, 200];
// main file
// Small test prints that check the fits before the full parts are printed.
//   magnet: a backplate section with the magnet seat
//   slot:   a short shelf slot, its opening long enough for one plug, on a
//           plate stub
//   socket: a block of the pocket's base with the rod's socket, and a stub
//           of the rod's top end, to check the glue fit and the key
// (The dock and the rod are small prints of their own: try the dock on the
// Car Thing, and thread the wires through the rod, before gluing.)
include <params.scad>
include <lib/geometry.scad>
include <lib/path.scad>
include <lib/magnet.scad>
include <lib/shelf.scad>
include <lib/dock.scad>
include <lib/pocket.scad>
include <lib/rod.scad>
include <lib/joint.scad>
include <lib/soft.scad>

part = "magnet";

// The slot stands on one end, as the standalone shelf prints: as owned, x runs
// from -len to 0, and turned up the x = 0 end sits on the bed.
module slot_coupon() {
  len = 2 * floor_end + 26;
  translate([0, 0, -floor_t - slot_depth()]) cube([len, plate_t, lip_h + 5 + floor_t + slot_depth()]);
  shelf_slot(len);
}
if (part == "slot") rotate([0, 90, 0]) as_owner() slot_coupon();

as_owner() if (part == "magnet") {
  bt = backplate_thickness();
  difference() {
    translate([-(magnet_d + 12) / 2, -(magnet_d + 12) / 2, -bt]) cube([magnet_d + 12, magnet_d + 12, bt]);
    magnet_seat();
  }
} else if (part == "socket") {
  // The block prints as the plate does, bore opening on the bed; the stub
  // stands on its cut end beside it.
  w = rod_d / 2 + 6;
  difference() {
    intersection() {
      union() {
        soft_slab([0, plate_w], [0, plate_h], plate_t, plate_r, soft_r);
        pocket_positive();
      }
      translate([rod_x() - w, -plate_t - pocket[1] - 1, 0]) cube([2 * w, pocket[1] + plate_t + 1, socket_depth + socket_cone_h() + 3]);
    }
    socket_negative();
    cord_channel();
  }
  translate([2 * w + 10, 0, 6]) difference() {
    intersection() {
      rod_solid();
      translate([rod_x() - rod_d, rod_y() - rod_d, -6]) cube([2 * rod_d, 2 * rod_d, socket_depth + 6]);
    }
    cord_channel();
  }
}
